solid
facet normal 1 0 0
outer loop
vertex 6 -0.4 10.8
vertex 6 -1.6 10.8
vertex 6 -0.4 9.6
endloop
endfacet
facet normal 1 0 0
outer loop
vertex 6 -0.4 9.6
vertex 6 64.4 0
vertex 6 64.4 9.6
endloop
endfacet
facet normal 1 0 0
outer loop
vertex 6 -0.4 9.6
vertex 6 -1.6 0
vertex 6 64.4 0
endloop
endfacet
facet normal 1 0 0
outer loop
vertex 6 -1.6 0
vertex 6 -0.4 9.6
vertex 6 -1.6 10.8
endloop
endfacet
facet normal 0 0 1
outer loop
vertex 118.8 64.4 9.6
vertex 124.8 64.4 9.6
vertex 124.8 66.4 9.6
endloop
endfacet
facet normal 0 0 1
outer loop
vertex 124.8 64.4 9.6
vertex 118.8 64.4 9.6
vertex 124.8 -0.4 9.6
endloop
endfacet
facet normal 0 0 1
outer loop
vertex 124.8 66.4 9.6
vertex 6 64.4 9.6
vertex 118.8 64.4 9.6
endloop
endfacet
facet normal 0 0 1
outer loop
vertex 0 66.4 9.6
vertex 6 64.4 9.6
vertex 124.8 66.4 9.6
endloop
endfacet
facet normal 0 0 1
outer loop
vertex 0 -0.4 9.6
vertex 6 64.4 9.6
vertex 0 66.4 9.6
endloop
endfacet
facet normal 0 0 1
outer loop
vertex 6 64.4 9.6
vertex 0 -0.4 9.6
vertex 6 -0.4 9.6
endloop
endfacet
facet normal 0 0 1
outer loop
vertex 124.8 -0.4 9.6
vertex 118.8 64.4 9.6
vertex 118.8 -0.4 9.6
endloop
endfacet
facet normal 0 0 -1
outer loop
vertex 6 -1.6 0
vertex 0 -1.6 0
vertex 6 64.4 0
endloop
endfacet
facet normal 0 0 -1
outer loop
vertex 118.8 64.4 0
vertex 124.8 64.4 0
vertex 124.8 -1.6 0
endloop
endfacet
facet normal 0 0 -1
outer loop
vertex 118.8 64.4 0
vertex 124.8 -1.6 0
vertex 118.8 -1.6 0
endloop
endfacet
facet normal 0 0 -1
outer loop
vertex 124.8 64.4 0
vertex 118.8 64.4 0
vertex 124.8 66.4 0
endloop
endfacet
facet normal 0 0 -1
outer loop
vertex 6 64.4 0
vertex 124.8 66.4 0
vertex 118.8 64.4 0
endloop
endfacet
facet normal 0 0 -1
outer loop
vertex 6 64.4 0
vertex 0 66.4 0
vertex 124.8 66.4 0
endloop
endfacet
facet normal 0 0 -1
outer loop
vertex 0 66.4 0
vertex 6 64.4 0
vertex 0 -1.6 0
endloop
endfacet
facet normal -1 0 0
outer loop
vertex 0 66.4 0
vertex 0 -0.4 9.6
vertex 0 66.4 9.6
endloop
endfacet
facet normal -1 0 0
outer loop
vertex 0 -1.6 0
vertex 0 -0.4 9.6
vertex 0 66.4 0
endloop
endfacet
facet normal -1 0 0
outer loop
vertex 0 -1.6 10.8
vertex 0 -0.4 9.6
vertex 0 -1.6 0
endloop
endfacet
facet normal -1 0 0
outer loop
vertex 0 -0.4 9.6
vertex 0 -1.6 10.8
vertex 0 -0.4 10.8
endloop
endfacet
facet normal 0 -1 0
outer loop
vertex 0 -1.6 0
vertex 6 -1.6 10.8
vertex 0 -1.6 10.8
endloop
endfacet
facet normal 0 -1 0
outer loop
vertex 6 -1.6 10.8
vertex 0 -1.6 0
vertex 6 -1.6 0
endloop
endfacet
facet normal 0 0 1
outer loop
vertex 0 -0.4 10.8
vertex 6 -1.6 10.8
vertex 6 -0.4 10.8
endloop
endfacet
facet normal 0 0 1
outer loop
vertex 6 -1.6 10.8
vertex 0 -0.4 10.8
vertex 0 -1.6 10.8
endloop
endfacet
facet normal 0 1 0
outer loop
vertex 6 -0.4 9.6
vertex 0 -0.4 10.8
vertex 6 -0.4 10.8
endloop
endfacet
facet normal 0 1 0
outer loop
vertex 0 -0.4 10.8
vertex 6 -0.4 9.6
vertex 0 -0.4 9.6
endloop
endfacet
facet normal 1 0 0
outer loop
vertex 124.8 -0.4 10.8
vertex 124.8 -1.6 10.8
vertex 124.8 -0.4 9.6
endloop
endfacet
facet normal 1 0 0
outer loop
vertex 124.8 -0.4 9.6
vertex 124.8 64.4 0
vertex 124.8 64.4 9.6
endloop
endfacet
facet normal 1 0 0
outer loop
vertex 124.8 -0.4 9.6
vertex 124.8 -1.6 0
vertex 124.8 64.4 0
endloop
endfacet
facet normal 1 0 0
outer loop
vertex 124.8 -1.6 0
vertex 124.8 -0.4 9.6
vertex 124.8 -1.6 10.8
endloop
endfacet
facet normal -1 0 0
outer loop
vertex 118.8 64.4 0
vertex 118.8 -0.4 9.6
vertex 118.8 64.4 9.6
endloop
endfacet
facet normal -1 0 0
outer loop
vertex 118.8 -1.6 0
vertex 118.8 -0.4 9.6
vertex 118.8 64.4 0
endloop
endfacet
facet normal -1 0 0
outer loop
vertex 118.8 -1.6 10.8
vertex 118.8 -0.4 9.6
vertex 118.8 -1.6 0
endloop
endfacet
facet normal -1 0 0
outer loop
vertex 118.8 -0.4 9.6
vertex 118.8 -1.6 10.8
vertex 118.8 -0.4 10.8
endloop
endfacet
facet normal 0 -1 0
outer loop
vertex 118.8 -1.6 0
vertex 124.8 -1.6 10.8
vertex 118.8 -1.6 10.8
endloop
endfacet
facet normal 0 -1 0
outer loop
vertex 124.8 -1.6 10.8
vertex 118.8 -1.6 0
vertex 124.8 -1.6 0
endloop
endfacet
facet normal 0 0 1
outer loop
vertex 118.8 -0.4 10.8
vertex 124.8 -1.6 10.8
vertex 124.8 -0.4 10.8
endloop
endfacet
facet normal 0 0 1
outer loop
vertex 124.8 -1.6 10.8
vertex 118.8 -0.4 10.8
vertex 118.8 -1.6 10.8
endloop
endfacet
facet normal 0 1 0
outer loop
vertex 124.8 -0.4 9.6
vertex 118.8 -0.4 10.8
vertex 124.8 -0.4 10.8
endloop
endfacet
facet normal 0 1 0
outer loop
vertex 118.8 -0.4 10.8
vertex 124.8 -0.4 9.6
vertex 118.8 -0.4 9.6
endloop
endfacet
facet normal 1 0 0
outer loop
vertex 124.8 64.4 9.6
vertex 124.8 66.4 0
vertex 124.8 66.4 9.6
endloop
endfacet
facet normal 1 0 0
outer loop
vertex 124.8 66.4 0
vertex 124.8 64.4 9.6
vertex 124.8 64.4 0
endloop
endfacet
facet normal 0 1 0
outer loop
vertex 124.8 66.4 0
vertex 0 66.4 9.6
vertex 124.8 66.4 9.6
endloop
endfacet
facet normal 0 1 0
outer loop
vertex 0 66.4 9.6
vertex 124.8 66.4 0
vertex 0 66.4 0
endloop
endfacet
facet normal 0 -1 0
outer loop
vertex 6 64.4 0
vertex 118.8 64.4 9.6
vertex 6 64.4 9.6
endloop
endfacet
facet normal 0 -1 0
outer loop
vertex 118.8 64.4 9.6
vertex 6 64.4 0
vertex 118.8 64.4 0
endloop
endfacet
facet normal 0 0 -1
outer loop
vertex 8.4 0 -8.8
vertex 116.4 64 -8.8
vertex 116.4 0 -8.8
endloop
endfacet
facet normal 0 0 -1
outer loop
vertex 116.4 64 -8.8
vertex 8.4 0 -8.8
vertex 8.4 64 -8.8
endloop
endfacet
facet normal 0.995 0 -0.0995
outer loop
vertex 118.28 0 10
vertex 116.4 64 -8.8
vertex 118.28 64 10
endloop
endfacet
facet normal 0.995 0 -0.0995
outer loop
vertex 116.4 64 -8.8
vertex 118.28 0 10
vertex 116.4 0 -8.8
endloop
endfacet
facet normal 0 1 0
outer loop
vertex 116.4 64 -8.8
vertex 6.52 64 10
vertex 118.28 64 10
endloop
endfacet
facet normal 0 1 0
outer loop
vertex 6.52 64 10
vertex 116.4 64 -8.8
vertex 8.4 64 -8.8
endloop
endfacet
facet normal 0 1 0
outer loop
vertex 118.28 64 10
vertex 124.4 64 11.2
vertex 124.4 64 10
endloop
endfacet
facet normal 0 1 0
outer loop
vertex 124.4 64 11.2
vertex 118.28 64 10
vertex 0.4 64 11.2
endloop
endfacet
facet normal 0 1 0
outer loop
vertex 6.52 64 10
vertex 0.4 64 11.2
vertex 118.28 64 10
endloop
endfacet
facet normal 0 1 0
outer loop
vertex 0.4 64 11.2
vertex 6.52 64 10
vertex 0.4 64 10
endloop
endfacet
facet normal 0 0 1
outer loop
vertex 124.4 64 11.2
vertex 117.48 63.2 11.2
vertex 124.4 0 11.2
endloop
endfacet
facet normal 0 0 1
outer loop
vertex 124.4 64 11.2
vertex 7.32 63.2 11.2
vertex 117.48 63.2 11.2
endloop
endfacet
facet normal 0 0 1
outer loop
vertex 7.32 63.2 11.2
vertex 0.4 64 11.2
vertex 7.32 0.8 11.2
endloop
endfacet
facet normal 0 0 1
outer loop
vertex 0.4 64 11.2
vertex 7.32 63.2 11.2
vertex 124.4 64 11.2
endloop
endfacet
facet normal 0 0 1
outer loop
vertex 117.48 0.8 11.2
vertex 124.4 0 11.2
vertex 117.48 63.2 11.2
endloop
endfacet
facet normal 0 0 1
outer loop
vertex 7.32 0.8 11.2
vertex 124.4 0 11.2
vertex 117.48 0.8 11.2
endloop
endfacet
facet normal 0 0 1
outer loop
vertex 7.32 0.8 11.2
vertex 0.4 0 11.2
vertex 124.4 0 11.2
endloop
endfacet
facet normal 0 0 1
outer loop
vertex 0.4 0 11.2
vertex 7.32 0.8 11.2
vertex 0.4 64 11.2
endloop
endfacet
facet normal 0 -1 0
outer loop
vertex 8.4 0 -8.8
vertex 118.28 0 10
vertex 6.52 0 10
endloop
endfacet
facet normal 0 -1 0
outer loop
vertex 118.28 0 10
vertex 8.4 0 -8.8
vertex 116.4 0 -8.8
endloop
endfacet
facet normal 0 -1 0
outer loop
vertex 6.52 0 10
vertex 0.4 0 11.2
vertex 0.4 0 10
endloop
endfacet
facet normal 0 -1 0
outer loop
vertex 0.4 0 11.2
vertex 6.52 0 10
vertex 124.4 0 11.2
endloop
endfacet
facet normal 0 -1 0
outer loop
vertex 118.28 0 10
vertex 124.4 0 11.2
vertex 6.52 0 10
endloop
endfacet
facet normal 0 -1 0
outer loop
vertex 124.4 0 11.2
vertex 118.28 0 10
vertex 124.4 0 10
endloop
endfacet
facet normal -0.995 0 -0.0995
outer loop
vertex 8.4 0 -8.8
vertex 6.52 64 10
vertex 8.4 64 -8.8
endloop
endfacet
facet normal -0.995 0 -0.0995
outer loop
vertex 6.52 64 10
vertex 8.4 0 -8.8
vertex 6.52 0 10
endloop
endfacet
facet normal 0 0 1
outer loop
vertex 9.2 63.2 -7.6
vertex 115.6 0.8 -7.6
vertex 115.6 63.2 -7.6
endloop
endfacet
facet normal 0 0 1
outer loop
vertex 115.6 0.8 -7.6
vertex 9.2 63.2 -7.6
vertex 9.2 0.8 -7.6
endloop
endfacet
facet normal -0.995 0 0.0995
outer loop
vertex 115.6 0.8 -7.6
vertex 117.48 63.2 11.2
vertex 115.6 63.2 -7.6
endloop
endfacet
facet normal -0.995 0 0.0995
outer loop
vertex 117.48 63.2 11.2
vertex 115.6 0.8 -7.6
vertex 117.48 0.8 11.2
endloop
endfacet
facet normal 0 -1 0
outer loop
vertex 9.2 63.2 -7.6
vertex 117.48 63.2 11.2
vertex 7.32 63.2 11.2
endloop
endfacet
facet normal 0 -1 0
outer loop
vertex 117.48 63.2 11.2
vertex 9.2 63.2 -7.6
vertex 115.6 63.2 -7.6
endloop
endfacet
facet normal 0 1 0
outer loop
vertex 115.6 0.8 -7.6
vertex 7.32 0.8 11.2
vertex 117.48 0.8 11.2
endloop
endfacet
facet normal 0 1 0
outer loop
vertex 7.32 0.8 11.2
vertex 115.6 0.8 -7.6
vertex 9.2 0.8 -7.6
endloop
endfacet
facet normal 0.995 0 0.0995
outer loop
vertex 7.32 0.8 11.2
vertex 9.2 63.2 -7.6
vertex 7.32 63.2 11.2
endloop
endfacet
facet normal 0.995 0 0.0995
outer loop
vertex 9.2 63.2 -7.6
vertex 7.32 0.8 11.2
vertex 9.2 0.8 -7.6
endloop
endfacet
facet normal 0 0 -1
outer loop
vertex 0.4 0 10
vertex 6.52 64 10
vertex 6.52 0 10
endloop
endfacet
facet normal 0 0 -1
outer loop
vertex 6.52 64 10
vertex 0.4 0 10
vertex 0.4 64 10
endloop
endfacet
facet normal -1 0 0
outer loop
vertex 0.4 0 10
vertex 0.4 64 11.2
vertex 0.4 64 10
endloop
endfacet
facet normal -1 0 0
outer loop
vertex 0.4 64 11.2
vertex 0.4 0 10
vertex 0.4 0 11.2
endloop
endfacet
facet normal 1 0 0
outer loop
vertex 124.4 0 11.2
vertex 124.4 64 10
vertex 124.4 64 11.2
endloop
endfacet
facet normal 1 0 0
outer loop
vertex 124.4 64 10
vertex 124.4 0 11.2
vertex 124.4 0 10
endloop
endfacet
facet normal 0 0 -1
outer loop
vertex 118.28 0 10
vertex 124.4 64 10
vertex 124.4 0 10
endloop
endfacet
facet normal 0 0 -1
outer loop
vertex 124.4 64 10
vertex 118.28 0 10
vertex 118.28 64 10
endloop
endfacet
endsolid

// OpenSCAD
width = 112;
length = 64;
depth = 20;

sideShrink = 2;
trayThickness = 0.8;
verticalThickness = 1.2;
tolerance = 0.4;

armWidth = 6;
holderBackThickness = 2;
holderLockLength = 1.2;

armHeight = 9.6;

module tray() {
    difference() { 
        trayShape(width, length);
        
        translate([trayThickness, trayThickness, verticalThickness])
        trayShape(width - 2 * trayThickness, length - 2 * trayThickness);
    }
    
    translate([-armWidth, 0, depth - verticalThickness])
    cube([armWidth + trayThickness, length, verticalThickness]);
    
    translate([width - trayThickness, 0, depth - verticalThickness])
    cube([armWidth + trayThickness, length, verticalThickness]);
}

module holder() {
    holderArm();
    
    translate([width + armWidth + 2 * tolerance, 0, 0])
    holderArm();
    
    translate([0, length + tolerance, 0])
    cube([width + 2 * tolerance + 2 * armWidth, holderBackThickness, armHeight]);
}

module holderArm() {
    translate([0, -holderLockLength - tolerance, 0]) {
        cube([armWidth, length + 2 * tolerance + holderLockLength, armHeight]);
        
        translate([0, 0, armHeight])
        cube([armWidth, holderLockLength, verticalThickness]);
    }
}

module trayShape(w, l) {
    translate([0, l, 0])
    rotate([90, 0, 0])
    linear_extrude(l)
    polygon([
        [sideShrink, 0],
        [w - sideShrink, 0],
        [w, depth],
        [0, depth]
    ]);
}

module testAssembly() {
    holder();
    
    translate([armWidth + tolerance, 0, armHeight - depth + verticalThickness + tolerance])
    tray();
}

testAssembly();
